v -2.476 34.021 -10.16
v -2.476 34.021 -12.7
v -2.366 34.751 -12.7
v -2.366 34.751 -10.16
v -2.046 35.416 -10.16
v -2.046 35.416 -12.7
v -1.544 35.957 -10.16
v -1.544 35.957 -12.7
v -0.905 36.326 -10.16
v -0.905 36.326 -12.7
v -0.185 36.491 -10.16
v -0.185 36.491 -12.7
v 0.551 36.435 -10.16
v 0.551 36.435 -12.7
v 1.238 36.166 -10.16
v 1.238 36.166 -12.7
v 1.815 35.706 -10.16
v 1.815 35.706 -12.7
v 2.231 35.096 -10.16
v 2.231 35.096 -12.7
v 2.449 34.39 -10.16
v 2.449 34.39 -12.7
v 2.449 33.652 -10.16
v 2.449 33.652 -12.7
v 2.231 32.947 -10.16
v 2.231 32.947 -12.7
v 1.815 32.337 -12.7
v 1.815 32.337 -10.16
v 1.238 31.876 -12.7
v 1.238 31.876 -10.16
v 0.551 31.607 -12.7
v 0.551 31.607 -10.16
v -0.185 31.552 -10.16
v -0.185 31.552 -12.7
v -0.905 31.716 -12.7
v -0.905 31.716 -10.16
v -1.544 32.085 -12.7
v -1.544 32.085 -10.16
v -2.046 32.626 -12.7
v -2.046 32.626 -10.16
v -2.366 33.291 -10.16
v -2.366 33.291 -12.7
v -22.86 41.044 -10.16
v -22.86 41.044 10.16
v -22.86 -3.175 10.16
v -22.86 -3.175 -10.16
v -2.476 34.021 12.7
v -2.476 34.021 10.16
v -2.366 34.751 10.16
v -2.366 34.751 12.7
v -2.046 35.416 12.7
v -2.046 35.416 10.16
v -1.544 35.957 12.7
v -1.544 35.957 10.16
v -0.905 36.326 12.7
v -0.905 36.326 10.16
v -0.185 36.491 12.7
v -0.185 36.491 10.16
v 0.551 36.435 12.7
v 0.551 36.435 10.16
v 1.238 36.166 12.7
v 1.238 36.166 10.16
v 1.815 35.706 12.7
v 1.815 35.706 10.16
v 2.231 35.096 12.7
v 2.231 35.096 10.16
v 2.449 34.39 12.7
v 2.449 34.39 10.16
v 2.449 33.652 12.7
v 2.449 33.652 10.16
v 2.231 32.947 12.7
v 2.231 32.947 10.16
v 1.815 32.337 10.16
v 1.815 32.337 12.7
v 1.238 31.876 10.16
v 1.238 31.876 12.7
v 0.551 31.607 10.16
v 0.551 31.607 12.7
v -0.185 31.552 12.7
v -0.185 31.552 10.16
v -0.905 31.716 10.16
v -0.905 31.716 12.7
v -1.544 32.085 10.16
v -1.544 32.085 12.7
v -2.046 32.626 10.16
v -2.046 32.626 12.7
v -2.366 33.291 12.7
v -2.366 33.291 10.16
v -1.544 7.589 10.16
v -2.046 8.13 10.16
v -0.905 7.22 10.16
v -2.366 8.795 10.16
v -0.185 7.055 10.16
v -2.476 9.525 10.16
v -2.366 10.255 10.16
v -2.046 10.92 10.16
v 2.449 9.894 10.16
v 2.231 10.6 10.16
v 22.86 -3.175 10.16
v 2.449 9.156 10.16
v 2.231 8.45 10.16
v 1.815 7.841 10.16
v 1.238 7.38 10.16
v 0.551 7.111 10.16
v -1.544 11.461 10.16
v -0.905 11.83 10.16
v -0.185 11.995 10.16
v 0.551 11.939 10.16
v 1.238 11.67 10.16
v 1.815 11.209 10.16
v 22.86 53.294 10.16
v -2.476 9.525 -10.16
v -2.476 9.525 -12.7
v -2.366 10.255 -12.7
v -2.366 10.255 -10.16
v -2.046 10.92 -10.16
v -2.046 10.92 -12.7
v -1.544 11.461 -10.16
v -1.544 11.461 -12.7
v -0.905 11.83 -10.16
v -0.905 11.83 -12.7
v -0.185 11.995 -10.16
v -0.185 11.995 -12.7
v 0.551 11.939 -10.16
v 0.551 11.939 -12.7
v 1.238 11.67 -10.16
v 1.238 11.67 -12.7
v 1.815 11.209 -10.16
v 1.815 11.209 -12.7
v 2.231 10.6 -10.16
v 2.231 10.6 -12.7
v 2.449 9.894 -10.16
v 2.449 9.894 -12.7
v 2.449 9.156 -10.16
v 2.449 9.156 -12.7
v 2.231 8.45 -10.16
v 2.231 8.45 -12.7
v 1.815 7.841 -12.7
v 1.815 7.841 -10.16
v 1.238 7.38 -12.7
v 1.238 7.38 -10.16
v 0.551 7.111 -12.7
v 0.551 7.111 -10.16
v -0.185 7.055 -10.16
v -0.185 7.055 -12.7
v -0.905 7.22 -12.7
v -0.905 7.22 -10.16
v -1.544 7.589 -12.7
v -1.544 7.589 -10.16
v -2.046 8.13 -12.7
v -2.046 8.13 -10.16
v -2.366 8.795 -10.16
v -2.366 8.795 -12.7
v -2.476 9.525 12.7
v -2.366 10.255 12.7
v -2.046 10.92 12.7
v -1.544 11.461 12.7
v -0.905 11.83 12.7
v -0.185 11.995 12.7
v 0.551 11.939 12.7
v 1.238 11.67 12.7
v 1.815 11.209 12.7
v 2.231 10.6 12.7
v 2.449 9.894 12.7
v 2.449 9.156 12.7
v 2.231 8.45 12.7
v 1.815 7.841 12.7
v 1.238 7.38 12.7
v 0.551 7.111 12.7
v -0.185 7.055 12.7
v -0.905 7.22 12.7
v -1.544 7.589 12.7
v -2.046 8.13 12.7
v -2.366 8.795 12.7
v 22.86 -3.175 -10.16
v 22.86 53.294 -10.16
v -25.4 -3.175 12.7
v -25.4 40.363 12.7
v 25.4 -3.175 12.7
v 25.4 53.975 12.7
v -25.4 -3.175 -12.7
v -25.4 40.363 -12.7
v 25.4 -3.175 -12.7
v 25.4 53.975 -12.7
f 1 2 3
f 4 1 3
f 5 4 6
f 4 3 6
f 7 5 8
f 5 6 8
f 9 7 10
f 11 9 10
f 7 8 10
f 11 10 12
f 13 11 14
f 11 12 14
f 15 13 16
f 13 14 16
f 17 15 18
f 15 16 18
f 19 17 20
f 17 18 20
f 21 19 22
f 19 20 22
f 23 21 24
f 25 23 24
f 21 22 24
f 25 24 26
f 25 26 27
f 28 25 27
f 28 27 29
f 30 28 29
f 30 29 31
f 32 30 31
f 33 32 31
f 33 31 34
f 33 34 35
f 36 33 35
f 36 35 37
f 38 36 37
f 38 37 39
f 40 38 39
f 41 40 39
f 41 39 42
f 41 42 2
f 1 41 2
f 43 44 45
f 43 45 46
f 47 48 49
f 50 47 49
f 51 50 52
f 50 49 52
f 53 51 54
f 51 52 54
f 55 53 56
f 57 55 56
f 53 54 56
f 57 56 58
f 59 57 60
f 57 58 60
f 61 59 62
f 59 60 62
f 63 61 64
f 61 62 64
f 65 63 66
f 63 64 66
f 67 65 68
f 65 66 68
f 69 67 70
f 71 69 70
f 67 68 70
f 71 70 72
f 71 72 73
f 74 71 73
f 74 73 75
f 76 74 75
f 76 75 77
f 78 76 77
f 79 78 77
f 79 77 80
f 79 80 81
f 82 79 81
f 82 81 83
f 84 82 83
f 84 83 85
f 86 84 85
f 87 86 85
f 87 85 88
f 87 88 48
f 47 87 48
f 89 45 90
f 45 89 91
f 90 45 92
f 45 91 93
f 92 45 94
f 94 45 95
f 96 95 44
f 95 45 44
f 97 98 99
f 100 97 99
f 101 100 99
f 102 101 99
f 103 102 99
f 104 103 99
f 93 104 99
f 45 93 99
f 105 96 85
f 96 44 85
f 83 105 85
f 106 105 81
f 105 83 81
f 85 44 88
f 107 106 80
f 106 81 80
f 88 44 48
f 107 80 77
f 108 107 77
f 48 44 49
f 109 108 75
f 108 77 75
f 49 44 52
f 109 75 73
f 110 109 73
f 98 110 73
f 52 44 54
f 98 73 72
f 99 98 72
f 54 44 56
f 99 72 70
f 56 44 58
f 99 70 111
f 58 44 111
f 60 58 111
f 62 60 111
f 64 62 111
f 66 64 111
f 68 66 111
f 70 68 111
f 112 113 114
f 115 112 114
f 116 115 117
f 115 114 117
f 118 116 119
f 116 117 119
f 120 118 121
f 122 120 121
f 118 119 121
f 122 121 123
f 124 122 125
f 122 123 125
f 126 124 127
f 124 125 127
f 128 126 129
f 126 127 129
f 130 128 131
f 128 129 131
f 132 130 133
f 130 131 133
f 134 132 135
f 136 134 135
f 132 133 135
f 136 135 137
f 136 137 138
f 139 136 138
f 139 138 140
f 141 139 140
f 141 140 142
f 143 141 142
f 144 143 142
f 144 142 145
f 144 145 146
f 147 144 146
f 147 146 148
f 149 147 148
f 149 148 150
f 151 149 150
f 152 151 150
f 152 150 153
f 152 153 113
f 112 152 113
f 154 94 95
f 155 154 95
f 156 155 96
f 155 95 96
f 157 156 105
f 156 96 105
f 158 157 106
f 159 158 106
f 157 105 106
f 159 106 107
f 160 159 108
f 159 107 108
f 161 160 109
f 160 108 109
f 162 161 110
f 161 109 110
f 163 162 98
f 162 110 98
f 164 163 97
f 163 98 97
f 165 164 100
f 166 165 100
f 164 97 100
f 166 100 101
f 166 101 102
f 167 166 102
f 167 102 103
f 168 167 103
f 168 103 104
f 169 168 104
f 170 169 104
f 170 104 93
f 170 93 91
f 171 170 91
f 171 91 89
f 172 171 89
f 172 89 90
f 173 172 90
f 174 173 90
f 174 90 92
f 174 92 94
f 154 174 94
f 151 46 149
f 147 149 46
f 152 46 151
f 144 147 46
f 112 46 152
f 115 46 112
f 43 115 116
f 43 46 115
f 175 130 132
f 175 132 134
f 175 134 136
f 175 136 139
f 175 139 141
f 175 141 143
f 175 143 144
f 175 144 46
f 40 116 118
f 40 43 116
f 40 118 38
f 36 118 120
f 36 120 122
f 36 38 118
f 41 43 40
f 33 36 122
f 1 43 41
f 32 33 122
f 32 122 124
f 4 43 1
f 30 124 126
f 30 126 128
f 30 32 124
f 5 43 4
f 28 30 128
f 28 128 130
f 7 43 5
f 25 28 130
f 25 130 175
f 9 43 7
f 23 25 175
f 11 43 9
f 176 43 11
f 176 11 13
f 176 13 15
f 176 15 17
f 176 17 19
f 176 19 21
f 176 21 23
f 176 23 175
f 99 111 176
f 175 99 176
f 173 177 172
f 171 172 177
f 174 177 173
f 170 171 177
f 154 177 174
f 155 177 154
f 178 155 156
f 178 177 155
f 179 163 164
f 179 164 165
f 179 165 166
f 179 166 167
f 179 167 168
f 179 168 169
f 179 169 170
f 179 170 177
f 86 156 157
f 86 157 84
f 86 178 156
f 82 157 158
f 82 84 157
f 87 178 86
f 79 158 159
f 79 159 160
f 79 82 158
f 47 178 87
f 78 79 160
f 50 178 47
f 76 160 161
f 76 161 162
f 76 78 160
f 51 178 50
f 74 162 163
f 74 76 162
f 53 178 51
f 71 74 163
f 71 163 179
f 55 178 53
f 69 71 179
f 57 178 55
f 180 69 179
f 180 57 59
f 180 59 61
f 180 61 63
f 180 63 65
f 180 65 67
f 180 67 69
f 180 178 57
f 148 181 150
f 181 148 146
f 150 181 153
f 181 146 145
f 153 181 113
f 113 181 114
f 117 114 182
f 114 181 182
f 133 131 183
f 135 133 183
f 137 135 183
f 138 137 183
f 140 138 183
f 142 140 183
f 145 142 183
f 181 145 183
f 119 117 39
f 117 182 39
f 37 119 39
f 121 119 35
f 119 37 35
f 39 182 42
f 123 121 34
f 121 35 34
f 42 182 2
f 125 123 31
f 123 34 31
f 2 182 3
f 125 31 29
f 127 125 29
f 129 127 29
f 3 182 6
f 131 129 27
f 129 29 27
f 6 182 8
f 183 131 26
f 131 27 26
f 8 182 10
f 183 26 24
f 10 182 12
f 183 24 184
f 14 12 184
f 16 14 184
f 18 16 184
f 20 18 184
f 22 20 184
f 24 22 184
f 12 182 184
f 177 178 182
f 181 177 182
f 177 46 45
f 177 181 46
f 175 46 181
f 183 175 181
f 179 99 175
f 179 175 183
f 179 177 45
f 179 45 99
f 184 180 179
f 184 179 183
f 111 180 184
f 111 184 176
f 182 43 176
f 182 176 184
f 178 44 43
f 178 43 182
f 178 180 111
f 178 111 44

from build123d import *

# Parameters (mm, degrees)
SKETCH1_W           = 50.8
SKETCH1_H           = 25.4
SKETCH1_W_2         = 45.72
SKETCH1_H_2         = 20.32
EXTRUDE_THIN1_DEPTH = 53.975
CUT_EXTRUDE1_DEPTH  = 26.4
SKETCH3_W           = 50.8
SKETCH3_H           = 50.8
CUT_EXTRUDE2_DEPTH  = 26.4
SKETCH5_R           = 2.4765
CUT_EXTRUDE4_DEPTH  = 26.4


with BuildPart() as part:
    # Sketch1 → Extrude-Thin1 (new body, symmetric)
    with BuildSketch(Plane(origin=(0, 0, 0), x_dir=(1, 0, 0), z_dir=(0, 1, 0))):
        Rectangle(SKETCH1_W, SKETCH1_H)
        Rectangle(SKETCH1_W_2, SKETCH1_H_2, mode=Mode.SUBTRACT)
    extrude(amount=EXTRUDE_THIN1_DEPTH, both=True)

    # Sketch2 → Cut-Extrude1 (cut, through all)
    with BuildSketch(Plane.XY.offset(12.7)):
        Polygon((-25.4, 53.975), (25.4, 53.975), (-25.4, 40.363181024), align=None)
    extrude(amount=-CUT_EXTRUDE1_DEPTH, mode=Mode.SUBTRACT)

    # Sketch3 → Cut-Extrude2 (cut, through all)
    with BuildSketch(Plane.XY.offset(12.7)):
        with Locations((0, -28.575)):
            Rectangle(SKETCH3_W, SKETCH3_H)
    extrude(amount=-CUT_EXTRUDE2_DEPTH, mode=Mode.SUBTRACT)

    # Sketch5 → Cut-Extrude4 (cut, through all)
    with BuildSketch(Plane(origin=(0, 0, -12.7), x_dir=(-1, 0, 0), z_dir=(0, 0, -1))):
        with Locations((0, 9.525)):
            Circle(SKETCH5_R)
        with Locations((0, 34.021083021)):
            Circle(SKETCH5_R)
    extrude(amount=-CUT_EXTRUDE4_DEPTH, mode=Mode.SUBTRACT)


solid = part.part
